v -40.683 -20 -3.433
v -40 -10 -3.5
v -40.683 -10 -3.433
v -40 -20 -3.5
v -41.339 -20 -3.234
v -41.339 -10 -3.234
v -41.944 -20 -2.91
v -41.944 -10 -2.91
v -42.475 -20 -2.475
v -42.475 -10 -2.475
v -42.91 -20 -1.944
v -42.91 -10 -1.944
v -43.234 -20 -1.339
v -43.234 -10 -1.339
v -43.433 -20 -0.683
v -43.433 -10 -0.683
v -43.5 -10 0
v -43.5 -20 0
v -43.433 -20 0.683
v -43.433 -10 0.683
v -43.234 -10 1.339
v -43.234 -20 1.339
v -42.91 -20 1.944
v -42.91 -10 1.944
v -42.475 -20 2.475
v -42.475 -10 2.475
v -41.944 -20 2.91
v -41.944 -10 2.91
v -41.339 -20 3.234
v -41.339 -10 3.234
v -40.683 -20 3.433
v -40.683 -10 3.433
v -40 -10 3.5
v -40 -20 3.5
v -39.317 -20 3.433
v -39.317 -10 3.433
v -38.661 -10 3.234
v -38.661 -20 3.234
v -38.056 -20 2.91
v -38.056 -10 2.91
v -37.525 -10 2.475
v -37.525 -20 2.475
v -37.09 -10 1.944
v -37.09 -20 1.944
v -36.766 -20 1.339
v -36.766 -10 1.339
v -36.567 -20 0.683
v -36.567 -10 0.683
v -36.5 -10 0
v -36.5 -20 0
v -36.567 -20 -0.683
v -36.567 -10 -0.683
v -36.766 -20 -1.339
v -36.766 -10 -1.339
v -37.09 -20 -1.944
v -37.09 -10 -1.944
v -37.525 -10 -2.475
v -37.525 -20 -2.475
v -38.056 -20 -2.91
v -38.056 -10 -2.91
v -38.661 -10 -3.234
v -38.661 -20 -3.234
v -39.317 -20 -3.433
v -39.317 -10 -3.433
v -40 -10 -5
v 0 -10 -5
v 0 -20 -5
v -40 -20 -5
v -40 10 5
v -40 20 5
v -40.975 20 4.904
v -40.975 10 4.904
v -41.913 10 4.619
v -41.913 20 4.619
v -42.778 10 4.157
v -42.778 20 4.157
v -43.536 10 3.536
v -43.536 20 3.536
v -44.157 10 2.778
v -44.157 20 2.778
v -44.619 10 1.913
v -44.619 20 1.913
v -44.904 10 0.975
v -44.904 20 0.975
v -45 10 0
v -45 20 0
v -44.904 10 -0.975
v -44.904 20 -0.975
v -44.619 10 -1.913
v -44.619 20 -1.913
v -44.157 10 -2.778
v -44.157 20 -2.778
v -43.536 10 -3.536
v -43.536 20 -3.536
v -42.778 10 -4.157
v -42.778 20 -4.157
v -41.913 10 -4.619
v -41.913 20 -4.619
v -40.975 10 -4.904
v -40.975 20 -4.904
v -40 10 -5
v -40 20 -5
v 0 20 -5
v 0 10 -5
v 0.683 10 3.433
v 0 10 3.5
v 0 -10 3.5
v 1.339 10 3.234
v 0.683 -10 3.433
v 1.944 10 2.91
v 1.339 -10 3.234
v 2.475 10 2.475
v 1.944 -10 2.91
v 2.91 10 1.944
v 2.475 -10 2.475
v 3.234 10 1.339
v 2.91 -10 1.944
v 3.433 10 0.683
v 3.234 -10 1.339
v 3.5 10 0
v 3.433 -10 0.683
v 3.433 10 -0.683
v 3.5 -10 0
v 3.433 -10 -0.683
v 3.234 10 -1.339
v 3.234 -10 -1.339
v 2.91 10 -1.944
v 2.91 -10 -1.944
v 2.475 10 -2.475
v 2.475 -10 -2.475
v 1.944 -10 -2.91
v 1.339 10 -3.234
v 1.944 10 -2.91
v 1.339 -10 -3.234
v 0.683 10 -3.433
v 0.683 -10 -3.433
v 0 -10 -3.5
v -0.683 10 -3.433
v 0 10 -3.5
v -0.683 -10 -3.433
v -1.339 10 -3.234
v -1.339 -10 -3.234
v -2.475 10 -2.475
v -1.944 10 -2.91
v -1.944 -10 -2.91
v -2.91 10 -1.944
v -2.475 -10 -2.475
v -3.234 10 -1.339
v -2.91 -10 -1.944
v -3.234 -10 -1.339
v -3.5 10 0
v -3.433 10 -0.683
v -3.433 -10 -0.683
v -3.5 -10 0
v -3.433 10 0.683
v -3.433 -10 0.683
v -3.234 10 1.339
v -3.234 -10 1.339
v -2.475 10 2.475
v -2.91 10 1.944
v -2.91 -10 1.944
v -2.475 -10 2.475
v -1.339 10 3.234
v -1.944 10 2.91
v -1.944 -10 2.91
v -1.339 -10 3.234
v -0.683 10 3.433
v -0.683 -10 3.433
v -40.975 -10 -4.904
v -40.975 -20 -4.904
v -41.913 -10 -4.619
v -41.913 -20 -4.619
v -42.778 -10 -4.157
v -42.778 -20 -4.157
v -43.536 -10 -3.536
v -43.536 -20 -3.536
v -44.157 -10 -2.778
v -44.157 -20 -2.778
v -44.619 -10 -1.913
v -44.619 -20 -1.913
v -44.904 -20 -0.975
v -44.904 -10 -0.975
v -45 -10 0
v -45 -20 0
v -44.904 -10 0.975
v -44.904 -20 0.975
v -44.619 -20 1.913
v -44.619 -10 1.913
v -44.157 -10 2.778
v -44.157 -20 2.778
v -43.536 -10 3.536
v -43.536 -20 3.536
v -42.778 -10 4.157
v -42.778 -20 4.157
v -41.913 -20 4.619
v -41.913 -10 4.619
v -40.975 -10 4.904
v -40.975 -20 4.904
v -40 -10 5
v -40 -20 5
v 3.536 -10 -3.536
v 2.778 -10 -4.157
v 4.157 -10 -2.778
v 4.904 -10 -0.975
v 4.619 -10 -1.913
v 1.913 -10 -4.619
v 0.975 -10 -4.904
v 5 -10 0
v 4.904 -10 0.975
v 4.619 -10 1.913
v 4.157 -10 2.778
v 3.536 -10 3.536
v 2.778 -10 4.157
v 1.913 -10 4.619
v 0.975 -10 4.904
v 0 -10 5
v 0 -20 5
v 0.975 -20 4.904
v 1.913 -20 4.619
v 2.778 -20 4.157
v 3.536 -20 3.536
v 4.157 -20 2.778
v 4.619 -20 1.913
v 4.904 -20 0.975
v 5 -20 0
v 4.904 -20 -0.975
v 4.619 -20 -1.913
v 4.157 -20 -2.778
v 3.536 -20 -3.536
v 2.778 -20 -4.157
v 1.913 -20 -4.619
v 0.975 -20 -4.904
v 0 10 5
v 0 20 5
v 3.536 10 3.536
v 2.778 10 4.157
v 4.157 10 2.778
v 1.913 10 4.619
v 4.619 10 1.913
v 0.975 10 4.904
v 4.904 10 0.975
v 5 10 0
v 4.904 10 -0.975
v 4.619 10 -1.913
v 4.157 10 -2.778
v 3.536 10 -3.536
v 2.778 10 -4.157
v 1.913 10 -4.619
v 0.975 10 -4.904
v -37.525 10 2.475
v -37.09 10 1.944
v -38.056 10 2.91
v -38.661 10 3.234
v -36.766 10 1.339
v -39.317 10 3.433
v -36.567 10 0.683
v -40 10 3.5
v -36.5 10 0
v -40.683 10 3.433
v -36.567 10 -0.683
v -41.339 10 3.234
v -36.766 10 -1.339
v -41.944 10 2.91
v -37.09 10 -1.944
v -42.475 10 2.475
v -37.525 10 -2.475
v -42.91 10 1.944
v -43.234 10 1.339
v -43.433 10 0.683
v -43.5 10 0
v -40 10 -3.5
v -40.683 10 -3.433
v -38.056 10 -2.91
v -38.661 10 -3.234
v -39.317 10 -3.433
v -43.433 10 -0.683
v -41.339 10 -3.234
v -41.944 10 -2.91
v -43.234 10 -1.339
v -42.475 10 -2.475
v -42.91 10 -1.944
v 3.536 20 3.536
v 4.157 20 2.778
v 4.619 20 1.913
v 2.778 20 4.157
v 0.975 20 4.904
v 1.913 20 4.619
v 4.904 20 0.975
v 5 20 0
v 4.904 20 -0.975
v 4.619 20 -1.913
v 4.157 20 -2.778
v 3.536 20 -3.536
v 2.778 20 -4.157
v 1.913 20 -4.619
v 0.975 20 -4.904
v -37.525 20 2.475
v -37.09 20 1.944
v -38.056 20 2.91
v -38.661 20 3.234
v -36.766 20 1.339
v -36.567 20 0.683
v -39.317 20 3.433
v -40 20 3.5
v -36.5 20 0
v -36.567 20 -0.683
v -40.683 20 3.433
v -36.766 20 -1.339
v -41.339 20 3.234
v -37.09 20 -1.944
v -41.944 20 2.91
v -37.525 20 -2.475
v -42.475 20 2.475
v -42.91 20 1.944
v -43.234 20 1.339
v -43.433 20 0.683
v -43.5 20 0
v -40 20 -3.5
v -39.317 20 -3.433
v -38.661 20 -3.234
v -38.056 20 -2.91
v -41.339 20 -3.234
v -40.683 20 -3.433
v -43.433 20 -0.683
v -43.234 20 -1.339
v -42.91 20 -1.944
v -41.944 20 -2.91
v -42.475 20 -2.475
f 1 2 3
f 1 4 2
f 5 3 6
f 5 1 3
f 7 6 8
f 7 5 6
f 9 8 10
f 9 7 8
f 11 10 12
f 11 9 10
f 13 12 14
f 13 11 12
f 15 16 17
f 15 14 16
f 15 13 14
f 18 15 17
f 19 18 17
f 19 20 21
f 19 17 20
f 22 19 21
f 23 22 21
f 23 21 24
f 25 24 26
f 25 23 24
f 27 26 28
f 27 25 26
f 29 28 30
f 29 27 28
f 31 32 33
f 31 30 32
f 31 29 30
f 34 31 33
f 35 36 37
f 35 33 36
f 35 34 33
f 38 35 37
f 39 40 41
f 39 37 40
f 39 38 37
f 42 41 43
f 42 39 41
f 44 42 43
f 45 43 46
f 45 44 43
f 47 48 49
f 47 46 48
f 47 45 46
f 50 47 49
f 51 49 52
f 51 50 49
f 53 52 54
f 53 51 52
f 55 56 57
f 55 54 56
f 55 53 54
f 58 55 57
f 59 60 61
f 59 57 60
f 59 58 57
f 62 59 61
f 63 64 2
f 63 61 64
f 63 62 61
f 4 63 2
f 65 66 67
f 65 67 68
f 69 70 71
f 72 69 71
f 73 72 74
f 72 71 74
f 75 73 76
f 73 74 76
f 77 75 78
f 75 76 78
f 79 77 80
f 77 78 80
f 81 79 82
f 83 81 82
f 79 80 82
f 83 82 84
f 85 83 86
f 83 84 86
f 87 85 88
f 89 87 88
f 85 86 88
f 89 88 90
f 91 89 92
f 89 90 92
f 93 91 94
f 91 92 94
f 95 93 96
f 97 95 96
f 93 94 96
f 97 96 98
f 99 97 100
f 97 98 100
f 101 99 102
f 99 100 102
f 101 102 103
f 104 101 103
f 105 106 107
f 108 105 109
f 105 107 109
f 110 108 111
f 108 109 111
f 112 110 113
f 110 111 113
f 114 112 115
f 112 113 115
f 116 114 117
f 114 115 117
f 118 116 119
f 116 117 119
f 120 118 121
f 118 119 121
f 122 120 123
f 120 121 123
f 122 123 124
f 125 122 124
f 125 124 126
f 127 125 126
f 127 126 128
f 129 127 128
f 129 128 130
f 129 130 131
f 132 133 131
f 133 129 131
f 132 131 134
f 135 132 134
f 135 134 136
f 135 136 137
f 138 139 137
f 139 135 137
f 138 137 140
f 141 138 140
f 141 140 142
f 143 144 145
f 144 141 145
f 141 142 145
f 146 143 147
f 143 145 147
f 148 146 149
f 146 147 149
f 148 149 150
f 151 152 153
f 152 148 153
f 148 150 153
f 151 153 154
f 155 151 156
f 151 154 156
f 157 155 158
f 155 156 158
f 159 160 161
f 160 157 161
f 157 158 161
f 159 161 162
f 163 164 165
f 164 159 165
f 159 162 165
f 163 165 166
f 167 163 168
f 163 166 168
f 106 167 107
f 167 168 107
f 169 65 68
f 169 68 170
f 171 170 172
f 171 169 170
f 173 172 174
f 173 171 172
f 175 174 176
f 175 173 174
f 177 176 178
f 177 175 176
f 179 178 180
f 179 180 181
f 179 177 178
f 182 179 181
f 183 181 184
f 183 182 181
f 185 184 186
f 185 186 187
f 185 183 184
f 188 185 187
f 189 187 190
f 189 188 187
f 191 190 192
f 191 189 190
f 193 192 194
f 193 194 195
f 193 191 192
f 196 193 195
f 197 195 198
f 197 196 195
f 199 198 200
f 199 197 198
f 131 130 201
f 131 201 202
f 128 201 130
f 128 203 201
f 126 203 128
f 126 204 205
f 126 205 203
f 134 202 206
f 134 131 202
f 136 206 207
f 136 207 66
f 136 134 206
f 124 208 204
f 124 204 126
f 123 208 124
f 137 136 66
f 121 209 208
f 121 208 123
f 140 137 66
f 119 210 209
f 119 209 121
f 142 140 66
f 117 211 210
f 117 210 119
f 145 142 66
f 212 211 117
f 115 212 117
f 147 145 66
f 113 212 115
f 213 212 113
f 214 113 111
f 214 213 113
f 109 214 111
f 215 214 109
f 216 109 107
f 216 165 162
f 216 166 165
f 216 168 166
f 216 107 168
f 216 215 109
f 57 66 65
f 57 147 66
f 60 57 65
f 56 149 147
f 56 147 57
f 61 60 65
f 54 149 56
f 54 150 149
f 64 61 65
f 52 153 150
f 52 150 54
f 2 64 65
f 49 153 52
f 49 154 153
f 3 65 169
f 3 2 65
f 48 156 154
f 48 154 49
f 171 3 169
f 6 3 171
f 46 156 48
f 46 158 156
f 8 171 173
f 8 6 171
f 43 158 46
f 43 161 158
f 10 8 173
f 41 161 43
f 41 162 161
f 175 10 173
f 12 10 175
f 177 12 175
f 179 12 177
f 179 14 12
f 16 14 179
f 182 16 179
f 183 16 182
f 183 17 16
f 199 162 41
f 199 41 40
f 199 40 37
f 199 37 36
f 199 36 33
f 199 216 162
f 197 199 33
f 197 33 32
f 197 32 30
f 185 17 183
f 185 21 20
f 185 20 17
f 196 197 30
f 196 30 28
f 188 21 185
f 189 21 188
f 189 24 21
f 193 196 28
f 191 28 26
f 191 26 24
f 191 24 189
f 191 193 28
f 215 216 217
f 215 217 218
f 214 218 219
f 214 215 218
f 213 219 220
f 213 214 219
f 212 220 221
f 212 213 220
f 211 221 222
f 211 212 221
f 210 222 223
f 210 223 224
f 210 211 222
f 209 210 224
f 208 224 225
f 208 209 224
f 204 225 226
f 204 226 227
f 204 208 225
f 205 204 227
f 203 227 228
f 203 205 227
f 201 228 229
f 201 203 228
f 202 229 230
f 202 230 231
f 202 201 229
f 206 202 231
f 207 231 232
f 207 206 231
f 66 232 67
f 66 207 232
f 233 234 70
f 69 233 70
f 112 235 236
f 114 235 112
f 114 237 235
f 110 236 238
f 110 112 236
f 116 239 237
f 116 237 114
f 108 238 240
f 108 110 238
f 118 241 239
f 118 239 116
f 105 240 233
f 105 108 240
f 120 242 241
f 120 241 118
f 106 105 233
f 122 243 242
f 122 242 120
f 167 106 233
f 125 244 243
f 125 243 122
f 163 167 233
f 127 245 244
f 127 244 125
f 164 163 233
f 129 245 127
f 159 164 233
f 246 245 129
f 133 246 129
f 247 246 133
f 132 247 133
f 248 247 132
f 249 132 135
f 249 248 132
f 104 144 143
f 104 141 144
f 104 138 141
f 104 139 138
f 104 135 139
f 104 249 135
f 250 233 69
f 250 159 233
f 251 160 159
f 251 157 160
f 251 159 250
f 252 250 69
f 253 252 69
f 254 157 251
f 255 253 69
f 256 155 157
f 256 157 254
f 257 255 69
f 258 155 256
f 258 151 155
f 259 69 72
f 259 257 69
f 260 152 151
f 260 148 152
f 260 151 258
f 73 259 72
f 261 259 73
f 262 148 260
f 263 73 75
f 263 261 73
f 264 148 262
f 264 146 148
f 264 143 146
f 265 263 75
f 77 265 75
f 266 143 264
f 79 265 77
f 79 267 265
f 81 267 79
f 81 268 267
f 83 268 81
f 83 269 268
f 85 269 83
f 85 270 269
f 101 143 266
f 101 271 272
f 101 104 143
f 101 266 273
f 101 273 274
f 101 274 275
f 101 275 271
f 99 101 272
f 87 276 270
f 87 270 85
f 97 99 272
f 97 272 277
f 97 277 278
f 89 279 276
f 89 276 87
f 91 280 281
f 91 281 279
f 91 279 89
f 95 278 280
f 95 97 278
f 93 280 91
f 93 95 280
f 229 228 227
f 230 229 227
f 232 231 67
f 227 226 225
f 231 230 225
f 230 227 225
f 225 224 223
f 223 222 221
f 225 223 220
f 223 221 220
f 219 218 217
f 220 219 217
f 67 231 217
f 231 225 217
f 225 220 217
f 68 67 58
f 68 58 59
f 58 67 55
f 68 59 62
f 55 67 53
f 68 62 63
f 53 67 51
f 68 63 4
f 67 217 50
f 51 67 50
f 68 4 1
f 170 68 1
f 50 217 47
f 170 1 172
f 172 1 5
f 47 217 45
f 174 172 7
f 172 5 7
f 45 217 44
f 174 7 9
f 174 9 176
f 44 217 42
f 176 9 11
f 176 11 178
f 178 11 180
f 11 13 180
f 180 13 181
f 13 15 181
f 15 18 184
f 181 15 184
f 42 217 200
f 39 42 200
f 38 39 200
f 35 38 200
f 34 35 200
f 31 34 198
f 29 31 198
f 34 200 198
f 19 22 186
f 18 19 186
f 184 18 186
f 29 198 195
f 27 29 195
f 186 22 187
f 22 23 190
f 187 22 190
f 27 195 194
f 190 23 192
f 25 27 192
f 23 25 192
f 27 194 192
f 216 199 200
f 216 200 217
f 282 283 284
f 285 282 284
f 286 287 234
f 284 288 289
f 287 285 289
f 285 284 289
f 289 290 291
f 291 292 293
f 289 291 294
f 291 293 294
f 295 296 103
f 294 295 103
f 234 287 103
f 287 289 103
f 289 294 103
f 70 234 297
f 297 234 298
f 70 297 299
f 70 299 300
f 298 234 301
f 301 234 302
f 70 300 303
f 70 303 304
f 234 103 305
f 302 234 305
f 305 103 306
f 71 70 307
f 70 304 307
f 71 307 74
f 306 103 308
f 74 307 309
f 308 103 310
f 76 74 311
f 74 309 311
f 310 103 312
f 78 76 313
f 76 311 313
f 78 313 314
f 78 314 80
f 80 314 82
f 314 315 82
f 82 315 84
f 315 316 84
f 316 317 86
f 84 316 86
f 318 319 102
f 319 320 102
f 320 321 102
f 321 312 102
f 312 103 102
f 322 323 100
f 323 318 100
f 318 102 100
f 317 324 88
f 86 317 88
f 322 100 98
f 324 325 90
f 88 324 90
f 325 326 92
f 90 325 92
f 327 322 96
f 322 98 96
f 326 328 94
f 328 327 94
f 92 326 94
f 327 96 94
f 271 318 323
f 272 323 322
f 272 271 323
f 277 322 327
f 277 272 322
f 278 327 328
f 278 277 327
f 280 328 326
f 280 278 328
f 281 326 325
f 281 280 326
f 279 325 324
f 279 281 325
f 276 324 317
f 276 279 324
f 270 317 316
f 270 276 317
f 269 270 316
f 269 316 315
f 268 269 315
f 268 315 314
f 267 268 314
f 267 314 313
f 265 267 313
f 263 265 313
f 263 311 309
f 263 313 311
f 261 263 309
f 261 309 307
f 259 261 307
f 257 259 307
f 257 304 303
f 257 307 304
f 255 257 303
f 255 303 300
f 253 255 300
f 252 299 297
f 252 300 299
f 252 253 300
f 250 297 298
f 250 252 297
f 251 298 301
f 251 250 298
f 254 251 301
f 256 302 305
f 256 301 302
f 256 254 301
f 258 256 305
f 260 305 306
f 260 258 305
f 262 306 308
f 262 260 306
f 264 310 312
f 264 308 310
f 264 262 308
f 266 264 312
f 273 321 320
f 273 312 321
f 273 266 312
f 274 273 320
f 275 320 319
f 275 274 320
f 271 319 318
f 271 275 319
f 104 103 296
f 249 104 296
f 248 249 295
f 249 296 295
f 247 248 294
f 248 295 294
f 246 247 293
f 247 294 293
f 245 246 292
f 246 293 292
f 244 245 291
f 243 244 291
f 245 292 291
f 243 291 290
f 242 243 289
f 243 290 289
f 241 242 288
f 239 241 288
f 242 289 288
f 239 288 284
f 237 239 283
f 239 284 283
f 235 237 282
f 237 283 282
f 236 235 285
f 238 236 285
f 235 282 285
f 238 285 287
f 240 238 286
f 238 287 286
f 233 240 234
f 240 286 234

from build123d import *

# Parameters (mm, degrees)
BOSS_EXTRUDE1_DEPTH      = 20
BOSS_EXTRUDE1_DEPTH_BACK = 20
SKETCH1_R                = 3.5
BOSS_EXTRUDE2_DEPTH      = 10
BOSS_EXTRUDE3_START      = -10
BOSS_EXTRUDE3_DEPTH      = 10
CUT_EXTRUDE1_DEPTH       = 21
CUT_EXTRUDE1_DEPTH_BACK  = 22
SKETCH4_R                = 3.5
BOSS_EXTRUDE4_DEPTH      = 20
BOSS_EXTRUDE4_DEPTH_BACK = 20
SKETCH5_R                = 3.5
CUT_EXTRUDE2_DEPTH       = 23
CUT_EXTRUDE2_DEPTH_BACK  = 23
SKETCH6_R                = 3.5


with BuildPart() as part:
    # Sketch1 → Boss-Extrude1 (new, two sides: drawn at the far end of the back side and taken through both)
    with BuildSketch(Plane(origin=(0, 0, 0), x_dir=(1, 0, 0), z_dir=(0, 1, 0)).offset(-BOSS_EXTRUDE1_DEPTH_BACK)):
        with Locations((-40, 0)):
            Circle(SKETCH1_R)
    extrude(amount=BOSS_EXTRUDE1_DEPTH + BOSS_EXTRUDE1_DEPTH_BACK)

    # Sketch2 → Boss-Extrude2 (add)
    with BuildSketch(Plane(origin=(0, 20, 0), x_dir=(1, 0, 0), z_dir=(0, 1, 0))):
        with BuildLine():
            Line((-40, 5), (0, 5))
            ThreePointArc((0, 5), (5, 0), (0, -5))
            Line((0, -5), (-40, -5))
            ThreePointArc((-40, -5), (-45, 0), (-40, 5))
        make_face()
    extrude(amount=-BOSS_EXTRUDE2_DEPTH)

    # Sketch3 → Boss-Extrude3 (add)
    with BuildSketch(Plane.XZ.offset(20).offset(BOSS_EXTRUDE3_START)):
        with BuildLine():
            Line((-40, 5), (0, 5))
            ThreePointArc((0, 5), (5, 0), (0, -5))
            Line((0, -5), (-40, -5))
            ThreePointArc((-40, -5), (-45, 0), (-40, 5))
        make_face()
    extrude(amount=BOSS_EXTRUDE3_DEPTH)

    # Sketch4 → Cut-Extrude1 (cut, two sides: drawn at the far end of the back side and taken through both)
    with BuildSketch(Plane(origin=(0, 0, 0), x_dir=(1, 0, 0), z_dir=(0, 1, 0)).offset(-CUT_EXTRUDE1_DEPTH_BACK)):
        Circle(SKETCH4_R)
    extrude(amount=CUT_EXTRUDE1_DEPTH + CUT_EXTRUDE1_DEPTH_BACK, mode=Mode.SUBTRACT)

    # Sketch5 → Boss-Extrude4 (add, two sides: drawn at the far end of the back side and taken through both)
    with BuildSketch(Plane(origin=(0, 0, 0), x_dir=(1, 0, 0), z_dir=(0, 1, 0)).offset(-BOSS_EXTRUDE4_DEPTH_BACK)):
        Circle(SKETCH5_R)
    extrude(amount=BOSS_EXTRUDE4_DEPTH + BOSS_EXTRUDE4_DEPTH_BACK)

    # Sketch6 → Cut-Extrude2 (cut, two sides: drawn at the far end of the back side and taken through both)
    with BuildSketch(Plane(origin=(0, 0, 0), x_dir=(1, 0, 0), z_dir=(0, 1, 0)).offset(-CUT_EXTRUDE2_DEPTH_BACK)):
        with Locations((-40, 0)):
            Circle(SKETCH6_R)
    extrude(amount=CUT_EXTRUDE2_DEPTH + CUT_EXTRUDE2_DEPTH_BACK, mode=Mode.SUBTRACT)


solid = part.part
